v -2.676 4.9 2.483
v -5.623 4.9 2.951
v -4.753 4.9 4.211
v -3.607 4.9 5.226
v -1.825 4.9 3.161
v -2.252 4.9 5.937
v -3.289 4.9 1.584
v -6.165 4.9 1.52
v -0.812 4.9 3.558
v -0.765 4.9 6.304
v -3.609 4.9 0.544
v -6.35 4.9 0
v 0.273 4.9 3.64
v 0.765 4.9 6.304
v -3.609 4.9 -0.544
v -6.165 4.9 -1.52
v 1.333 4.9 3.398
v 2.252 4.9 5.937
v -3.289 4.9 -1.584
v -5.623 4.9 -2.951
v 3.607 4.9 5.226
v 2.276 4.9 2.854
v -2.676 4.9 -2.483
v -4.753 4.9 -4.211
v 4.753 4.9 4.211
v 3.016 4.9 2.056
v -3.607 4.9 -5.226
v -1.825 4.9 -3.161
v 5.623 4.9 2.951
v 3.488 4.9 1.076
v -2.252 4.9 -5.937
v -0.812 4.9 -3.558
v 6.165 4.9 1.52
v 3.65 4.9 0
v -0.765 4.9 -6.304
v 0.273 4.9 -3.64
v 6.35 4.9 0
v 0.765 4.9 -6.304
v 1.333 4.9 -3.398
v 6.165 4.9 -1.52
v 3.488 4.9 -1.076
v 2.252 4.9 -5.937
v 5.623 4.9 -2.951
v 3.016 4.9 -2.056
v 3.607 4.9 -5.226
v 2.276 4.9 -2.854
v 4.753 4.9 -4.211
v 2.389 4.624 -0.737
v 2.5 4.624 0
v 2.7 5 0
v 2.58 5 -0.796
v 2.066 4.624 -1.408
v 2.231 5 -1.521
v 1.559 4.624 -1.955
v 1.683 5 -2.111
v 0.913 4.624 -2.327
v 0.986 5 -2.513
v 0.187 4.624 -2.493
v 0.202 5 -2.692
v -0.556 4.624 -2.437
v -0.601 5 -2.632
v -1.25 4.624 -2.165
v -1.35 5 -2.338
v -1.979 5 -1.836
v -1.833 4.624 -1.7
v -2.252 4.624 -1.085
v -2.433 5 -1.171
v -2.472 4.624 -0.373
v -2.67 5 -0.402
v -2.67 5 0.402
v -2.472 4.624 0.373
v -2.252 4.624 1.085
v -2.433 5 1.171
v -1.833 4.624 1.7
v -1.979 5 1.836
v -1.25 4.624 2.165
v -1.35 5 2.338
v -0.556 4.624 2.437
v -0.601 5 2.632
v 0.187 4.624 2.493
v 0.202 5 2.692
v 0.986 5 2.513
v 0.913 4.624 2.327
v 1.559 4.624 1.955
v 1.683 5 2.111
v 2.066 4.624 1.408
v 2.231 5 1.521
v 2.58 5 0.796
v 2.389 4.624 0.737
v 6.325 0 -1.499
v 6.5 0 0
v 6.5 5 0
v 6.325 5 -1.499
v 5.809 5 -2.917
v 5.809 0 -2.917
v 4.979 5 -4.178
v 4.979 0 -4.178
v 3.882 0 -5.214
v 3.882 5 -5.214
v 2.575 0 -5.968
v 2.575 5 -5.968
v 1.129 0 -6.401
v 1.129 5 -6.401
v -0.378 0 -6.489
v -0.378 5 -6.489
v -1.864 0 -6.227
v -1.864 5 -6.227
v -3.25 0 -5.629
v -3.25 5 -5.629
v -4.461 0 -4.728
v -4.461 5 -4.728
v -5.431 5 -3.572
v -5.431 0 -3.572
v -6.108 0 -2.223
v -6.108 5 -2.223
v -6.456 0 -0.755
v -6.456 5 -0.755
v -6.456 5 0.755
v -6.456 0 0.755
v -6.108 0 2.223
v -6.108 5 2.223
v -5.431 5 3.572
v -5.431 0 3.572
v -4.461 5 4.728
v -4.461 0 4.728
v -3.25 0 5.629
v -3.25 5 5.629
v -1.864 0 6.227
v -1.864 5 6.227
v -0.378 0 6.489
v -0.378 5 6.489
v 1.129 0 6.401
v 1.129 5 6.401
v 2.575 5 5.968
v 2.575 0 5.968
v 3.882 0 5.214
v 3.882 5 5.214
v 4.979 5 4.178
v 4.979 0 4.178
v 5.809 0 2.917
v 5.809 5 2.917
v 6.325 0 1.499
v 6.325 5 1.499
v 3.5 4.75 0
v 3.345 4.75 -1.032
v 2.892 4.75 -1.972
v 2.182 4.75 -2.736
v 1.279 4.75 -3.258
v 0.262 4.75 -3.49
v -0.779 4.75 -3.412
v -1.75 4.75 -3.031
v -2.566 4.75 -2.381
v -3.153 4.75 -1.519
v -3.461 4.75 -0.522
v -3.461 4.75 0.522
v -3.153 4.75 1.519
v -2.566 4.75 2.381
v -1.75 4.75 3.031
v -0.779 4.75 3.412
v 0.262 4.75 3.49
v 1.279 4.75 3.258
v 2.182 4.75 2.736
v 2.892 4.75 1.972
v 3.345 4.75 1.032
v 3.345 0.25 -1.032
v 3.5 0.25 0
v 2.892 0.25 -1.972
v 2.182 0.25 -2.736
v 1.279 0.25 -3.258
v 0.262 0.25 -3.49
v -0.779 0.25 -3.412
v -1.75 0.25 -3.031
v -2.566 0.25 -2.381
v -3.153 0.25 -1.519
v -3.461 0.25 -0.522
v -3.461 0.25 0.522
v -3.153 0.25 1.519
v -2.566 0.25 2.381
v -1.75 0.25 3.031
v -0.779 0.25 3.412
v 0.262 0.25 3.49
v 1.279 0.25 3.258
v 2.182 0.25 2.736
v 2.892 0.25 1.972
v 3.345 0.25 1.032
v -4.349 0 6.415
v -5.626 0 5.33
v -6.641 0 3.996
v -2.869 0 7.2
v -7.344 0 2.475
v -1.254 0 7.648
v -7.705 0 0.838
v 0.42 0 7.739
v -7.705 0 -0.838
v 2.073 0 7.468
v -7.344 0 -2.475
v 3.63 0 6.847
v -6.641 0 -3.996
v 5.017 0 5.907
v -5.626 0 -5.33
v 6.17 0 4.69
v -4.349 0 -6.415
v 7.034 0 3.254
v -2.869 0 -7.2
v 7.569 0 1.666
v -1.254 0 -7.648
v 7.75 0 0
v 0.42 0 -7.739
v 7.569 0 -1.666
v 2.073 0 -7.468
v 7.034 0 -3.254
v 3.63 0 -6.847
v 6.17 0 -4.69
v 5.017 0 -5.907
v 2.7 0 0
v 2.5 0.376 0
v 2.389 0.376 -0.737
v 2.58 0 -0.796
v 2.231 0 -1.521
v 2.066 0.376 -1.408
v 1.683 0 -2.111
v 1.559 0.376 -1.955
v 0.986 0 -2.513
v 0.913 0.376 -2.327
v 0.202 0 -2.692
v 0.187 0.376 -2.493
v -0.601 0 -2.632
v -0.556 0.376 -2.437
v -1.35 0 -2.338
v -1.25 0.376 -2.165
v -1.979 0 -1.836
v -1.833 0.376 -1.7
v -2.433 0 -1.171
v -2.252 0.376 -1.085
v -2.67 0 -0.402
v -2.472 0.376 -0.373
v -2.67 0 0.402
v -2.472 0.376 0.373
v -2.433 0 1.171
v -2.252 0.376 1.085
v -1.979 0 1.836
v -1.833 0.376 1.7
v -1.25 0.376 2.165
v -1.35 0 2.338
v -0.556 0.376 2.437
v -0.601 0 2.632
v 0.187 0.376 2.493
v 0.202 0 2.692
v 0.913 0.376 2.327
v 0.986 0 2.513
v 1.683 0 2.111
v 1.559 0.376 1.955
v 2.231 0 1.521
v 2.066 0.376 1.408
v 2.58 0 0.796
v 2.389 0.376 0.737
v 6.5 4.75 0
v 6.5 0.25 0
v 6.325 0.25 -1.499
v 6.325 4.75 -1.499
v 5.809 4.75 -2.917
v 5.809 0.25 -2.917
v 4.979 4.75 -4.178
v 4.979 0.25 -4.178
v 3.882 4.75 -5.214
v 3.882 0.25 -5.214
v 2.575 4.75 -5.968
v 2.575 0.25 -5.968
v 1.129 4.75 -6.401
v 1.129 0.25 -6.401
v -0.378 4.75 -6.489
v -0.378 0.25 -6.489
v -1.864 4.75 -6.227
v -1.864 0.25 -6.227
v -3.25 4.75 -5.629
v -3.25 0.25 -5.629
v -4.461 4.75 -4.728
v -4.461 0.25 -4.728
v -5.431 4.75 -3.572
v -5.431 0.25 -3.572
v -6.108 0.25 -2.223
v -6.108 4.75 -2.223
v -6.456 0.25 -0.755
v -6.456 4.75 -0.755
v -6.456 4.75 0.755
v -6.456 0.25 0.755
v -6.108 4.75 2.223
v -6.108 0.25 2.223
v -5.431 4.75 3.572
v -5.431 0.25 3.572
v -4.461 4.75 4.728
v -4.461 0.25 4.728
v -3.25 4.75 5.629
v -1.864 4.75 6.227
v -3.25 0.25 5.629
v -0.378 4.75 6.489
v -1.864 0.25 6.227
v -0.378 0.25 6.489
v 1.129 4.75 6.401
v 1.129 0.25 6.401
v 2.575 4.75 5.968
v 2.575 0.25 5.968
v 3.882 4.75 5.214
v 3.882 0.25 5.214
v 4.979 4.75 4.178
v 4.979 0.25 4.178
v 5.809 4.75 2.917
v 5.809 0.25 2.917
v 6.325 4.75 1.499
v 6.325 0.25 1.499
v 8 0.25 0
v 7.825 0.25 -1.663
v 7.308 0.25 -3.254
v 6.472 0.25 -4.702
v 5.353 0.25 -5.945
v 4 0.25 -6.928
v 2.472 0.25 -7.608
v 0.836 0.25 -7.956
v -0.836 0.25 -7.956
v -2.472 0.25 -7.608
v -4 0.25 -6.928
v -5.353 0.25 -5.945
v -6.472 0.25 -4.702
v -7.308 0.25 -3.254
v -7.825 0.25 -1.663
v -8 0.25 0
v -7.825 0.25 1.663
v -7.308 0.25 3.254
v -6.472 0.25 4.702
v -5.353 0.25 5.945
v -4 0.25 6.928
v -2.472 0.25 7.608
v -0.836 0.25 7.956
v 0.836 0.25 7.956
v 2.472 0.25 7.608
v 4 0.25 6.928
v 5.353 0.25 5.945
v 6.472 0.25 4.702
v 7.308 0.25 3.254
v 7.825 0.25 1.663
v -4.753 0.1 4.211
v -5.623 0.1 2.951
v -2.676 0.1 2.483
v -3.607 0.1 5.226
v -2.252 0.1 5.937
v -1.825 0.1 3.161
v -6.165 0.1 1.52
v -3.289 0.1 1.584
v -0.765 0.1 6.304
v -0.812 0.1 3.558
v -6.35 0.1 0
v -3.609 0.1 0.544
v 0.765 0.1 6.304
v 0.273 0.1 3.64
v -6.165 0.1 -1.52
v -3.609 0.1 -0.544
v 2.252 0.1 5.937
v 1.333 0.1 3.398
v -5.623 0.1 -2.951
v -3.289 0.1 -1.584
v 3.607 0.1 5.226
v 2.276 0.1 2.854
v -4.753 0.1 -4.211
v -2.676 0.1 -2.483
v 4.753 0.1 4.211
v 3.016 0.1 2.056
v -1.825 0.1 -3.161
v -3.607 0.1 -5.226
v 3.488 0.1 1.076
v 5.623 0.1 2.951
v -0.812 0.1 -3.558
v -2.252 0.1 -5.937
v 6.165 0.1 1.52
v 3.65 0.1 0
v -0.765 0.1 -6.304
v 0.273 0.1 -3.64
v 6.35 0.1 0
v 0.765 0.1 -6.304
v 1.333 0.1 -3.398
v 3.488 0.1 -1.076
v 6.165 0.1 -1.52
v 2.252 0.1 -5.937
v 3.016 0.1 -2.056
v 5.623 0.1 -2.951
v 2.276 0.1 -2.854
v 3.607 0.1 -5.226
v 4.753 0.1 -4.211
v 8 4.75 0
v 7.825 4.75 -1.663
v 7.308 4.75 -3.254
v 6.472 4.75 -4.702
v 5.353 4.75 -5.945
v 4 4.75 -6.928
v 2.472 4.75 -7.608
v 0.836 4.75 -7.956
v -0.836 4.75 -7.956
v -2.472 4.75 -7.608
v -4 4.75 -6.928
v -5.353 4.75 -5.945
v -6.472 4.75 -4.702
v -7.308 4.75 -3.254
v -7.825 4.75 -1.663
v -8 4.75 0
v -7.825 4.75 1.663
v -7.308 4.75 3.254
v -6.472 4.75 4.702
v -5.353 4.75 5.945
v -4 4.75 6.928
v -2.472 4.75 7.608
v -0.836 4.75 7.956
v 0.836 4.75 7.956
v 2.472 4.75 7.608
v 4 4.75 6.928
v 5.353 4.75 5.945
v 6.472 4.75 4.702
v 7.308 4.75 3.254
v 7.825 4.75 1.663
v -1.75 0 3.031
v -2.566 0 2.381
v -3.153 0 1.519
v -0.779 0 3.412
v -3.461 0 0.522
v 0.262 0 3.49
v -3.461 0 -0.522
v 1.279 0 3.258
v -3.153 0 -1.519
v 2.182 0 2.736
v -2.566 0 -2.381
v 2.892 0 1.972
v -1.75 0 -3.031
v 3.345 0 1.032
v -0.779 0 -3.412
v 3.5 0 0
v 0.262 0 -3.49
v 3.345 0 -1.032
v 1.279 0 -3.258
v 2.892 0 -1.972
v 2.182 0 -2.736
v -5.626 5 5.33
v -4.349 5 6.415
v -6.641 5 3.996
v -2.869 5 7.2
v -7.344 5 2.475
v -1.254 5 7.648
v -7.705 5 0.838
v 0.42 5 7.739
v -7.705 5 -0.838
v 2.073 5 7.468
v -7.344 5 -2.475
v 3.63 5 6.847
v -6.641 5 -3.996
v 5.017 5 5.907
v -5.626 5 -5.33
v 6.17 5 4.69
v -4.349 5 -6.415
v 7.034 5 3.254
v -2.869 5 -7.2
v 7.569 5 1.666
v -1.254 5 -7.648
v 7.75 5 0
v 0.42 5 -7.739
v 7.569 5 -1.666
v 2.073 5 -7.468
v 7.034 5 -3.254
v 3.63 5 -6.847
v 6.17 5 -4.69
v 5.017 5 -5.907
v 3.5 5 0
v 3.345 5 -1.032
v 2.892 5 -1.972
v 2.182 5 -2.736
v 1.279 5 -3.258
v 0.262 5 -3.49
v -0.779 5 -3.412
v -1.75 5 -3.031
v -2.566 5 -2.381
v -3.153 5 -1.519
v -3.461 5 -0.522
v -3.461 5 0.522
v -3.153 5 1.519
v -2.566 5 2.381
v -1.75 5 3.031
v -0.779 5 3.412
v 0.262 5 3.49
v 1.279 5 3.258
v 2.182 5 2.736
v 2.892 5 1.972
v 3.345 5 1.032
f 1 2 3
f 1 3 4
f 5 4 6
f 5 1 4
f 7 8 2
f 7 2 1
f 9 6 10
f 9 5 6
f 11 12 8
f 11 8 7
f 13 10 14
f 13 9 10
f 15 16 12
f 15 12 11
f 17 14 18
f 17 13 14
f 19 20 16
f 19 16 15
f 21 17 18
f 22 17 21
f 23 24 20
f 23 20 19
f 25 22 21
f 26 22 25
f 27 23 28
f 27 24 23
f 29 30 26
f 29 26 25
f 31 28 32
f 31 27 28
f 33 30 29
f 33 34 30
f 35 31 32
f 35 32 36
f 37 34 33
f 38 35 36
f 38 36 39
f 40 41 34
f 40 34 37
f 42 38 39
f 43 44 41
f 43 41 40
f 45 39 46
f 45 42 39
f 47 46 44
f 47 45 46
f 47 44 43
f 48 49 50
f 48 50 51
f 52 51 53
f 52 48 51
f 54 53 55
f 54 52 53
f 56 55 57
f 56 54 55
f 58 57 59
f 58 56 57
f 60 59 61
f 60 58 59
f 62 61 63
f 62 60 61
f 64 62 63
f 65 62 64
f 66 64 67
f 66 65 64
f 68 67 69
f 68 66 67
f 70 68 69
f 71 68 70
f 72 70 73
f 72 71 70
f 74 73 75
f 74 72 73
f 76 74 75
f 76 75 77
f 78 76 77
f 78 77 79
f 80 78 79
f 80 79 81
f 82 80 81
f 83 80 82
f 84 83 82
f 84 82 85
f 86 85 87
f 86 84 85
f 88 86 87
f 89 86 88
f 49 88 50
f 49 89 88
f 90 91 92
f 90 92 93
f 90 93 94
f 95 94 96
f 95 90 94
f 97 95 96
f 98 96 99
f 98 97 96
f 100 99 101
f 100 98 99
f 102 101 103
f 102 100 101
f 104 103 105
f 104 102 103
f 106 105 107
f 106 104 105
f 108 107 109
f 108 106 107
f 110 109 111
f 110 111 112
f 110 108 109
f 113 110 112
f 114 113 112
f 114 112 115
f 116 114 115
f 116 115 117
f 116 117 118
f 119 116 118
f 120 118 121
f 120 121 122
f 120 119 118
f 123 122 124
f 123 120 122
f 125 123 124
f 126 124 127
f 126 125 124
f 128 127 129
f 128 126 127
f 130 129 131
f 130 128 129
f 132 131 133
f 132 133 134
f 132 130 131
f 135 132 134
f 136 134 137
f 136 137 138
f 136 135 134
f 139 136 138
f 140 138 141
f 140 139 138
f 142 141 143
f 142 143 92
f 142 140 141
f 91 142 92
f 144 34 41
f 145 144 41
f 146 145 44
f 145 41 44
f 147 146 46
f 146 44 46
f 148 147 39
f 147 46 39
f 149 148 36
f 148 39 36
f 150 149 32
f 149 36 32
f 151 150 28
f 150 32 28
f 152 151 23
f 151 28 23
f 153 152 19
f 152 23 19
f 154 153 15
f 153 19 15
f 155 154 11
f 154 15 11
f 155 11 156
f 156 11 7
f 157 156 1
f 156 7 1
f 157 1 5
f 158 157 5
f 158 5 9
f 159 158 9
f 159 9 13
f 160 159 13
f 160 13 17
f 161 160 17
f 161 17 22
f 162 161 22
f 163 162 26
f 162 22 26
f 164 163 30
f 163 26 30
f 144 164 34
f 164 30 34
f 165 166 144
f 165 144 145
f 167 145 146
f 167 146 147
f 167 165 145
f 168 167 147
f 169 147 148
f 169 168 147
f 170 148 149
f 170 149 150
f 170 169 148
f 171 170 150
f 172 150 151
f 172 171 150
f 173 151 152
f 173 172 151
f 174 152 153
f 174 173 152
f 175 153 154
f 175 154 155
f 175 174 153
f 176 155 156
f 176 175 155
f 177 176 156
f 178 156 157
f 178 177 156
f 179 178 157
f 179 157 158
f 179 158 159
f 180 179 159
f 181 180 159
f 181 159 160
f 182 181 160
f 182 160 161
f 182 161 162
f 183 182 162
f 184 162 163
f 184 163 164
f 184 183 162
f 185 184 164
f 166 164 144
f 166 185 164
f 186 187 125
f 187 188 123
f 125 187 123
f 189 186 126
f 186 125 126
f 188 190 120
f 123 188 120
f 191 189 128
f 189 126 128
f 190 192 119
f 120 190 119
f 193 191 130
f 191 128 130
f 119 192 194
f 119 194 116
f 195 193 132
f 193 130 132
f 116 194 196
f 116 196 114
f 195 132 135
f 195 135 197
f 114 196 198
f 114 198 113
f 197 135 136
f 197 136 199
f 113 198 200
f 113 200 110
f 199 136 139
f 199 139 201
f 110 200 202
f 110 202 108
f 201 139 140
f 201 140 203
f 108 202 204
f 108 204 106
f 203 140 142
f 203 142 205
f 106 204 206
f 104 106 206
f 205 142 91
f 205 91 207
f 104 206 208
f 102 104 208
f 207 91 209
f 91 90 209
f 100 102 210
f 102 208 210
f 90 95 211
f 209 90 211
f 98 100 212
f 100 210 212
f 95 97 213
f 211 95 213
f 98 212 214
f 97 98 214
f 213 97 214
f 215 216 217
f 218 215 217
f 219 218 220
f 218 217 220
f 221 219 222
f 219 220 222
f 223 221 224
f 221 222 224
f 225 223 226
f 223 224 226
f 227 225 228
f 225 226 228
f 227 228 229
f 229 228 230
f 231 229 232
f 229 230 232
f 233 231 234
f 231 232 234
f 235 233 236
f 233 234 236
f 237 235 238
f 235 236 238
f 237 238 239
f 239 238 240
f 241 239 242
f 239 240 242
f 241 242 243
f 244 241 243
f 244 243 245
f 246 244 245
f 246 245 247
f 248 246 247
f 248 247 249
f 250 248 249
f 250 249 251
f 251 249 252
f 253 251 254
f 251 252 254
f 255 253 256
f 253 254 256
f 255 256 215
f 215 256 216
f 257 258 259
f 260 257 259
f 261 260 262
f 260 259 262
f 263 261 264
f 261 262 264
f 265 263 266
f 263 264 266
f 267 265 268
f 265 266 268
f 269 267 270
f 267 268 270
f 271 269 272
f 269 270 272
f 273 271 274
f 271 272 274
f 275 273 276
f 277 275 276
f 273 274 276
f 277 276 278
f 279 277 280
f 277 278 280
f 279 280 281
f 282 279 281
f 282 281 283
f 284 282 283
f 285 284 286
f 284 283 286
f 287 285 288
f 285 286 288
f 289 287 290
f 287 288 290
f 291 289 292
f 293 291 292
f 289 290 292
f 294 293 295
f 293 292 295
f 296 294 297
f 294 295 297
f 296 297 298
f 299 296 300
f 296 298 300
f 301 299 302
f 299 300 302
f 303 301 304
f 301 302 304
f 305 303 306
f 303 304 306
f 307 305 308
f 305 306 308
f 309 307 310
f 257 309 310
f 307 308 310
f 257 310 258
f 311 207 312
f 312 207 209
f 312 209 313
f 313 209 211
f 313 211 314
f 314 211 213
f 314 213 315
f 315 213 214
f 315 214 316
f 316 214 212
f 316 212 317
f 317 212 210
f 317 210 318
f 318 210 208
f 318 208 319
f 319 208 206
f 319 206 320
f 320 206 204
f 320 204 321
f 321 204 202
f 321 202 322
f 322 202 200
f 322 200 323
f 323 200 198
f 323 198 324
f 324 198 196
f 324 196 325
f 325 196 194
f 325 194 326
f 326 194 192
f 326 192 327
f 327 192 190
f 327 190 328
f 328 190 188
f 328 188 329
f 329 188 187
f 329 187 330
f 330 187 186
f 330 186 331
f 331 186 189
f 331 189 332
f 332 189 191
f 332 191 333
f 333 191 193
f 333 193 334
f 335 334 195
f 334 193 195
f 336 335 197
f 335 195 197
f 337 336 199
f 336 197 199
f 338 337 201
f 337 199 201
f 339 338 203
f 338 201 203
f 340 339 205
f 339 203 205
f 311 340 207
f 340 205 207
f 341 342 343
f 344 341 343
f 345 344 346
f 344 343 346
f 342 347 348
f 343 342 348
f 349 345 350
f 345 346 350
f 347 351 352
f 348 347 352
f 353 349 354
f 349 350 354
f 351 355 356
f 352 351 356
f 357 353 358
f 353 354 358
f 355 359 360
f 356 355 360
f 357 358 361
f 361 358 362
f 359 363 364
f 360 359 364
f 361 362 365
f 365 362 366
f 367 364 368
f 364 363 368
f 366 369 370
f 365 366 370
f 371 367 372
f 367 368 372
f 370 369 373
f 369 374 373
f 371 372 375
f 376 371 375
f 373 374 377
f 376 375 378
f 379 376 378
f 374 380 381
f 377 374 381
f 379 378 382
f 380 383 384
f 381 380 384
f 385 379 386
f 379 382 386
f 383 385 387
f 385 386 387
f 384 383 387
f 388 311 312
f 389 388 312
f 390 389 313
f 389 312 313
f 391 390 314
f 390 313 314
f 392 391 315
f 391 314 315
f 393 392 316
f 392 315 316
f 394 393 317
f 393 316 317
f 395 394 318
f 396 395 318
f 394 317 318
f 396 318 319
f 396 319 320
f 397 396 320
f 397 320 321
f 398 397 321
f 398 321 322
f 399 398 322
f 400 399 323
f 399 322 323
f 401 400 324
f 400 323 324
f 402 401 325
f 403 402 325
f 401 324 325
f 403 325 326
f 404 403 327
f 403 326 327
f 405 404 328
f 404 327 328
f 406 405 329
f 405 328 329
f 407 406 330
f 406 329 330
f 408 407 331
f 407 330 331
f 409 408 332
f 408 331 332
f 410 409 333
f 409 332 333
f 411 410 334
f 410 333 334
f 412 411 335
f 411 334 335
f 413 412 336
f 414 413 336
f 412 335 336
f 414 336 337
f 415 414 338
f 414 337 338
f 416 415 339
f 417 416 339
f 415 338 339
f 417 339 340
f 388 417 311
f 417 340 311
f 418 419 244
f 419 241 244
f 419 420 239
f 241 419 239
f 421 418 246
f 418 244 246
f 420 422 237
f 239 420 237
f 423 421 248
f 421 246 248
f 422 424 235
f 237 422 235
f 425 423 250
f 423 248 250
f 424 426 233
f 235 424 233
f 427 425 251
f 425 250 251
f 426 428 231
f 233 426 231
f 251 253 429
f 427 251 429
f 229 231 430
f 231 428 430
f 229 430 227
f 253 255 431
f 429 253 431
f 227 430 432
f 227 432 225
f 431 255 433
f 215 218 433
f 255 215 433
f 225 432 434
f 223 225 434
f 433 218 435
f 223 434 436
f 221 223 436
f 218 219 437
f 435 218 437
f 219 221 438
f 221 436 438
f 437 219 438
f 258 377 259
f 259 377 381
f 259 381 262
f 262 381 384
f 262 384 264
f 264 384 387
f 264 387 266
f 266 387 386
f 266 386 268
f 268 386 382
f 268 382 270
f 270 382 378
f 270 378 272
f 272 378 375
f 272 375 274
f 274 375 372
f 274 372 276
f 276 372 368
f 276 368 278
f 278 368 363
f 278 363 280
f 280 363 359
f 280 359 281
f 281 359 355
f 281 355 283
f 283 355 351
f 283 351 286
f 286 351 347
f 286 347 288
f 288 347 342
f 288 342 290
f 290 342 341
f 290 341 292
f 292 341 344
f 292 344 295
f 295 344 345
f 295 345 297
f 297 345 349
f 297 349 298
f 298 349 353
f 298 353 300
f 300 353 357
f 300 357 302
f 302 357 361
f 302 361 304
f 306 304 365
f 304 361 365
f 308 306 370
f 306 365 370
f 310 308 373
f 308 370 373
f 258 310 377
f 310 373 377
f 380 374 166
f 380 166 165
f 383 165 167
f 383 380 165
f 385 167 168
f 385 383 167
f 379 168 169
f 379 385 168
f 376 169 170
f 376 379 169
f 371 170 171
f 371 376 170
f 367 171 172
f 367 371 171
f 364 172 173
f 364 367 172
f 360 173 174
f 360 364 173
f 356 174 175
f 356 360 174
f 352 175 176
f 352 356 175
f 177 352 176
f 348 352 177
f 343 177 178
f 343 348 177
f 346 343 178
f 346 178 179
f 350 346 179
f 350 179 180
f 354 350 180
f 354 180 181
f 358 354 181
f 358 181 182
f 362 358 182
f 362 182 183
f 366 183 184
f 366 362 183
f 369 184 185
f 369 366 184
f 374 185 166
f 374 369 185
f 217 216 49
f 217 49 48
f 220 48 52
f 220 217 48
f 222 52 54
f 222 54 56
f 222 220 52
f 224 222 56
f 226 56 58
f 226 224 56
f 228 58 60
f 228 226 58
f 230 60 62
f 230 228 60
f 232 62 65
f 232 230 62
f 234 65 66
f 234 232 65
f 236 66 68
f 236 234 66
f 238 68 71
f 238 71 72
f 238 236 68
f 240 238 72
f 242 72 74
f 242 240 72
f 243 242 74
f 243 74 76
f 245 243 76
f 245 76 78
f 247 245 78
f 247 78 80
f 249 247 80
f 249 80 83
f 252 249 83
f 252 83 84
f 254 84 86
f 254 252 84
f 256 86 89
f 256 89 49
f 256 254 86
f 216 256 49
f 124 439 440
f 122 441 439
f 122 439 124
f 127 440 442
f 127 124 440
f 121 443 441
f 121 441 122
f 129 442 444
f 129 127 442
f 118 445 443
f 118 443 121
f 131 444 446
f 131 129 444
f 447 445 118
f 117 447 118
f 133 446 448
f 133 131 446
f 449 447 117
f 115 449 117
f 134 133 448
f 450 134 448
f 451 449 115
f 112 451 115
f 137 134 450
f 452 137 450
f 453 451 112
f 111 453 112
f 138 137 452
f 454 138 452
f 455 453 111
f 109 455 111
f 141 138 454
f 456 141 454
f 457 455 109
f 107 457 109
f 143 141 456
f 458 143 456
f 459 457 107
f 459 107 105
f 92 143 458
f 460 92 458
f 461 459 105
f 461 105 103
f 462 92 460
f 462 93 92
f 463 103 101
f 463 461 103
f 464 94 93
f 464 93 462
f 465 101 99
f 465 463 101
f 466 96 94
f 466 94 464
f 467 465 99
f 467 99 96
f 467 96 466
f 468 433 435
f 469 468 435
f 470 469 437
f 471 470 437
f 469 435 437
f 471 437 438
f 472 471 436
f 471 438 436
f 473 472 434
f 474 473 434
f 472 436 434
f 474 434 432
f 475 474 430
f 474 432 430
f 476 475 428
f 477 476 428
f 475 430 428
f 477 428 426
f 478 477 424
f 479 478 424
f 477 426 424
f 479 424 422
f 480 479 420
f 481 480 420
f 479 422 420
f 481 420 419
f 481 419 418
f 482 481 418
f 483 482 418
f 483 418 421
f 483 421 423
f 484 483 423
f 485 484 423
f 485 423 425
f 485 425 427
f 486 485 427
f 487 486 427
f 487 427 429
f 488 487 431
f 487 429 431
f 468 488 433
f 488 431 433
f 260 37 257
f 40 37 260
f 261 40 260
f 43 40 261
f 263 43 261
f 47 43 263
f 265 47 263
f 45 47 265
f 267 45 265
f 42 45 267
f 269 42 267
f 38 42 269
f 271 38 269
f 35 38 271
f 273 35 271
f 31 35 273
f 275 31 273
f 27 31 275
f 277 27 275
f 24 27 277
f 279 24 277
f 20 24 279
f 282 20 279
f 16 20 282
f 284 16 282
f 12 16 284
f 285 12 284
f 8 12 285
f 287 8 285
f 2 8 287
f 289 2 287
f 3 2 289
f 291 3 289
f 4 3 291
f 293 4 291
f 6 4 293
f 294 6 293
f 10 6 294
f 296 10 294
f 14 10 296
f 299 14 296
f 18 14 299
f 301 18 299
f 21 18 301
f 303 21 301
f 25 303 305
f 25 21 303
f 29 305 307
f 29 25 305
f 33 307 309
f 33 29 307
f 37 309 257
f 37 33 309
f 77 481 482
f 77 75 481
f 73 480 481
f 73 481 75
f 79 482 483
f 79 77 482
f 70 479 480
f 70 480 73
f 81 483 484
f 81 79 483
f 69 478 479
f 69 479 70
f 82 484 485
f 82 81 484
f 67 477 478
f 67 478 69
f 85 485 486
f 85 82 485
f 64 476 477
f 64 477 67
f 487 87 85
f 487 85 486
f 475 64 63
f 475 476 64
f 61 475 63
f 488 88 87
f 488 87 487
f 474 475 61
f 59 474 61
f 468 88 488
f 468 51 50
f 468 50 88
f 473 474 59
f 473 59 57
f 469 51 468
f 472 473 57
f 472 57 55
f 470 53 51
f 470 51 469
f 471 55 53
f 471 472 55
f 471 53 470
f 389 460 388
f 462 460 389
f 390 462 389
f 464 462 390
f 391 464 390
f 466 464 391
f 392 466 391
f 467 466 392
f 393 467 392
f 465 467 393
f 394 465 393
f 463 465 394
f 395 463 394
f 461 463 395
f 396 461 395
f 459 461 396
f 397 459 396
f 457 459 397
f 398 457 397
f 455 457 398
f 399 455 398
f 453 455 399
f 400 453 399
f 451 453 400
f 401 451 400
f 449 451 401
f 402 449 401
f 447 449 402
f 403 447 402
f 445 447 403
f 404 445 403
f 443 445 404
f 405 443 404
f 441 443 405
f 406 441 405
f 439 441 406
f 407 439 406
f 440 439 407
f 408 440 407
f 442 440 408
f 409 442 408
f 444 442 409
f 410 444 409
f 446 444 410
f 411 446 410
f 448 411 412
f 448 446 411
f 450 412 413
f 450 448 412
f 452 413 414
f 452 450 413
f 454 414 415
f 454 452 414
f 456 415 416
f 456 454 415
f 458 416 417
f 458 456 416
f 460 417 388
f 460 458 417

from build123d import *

# Parameters (mm, degrees)
SKETCH_1_R        = 3.5
SKETCH_1_R_2      = 2.5
EXTRUDE_1_DEPTH   = 5
SKETCH_1_R_3      = 8
SKETCH_1_R_4      = 6.5
EXTRUDE_1_2_DEPTH = 5
EXTRUDE_START     = 0.1
SKETCH_1_3_R      = 6.5
SKETCH_1_3_R_2    = 3.5
EXTRUDE_2_DEPTH   = 4.8
CHAMFER_1_SIZE    = 0.25
CHAMFER_2_SIZE    = 0.2
CHAMFER_2_SIZE2   = 0.376145293
CHAMFER_3_SIZE    = 0.15
CHAMFER_4_SIZE    = 0.2
CHAMFER_4_SIZE2   = 0.376145293


with BuildPart() as part:
    # Эскиз1 → Бобышка-Вытянуть1 (new body)
    with BuildSketch(Plane(origin=(0, 0, 0), x_dir=(1, 0, 0), z_dir=(0, 1, 0))):
        Circle(SKETCH_1_R)
        Circle(SKETCH_1_R_2, mode=Mode.SUBTRACT)
    extrude(amount=EXTRUDE_1_DEPTH)

    # Фаска2
    chamfer_2_edges = [part.edges().sort_by_distance(p)[0] for p in [
        (-2.5, 5, 0),
    ]]
    chamfer_2_side = [part.faces().sort_by_distance(p)[0] for p in [
        (-3.401005051, 5, 0),
    ]]
    chamfer(chamfer_2_edges, length=CHAMFER_2_SIZE, length2=CHAMFER_2_SIZE2, reference=chamfer_2_side[0])

    # Фаска4
    chamfer_4_edges = [part.edges().sort_by_distance(p)[0] for p in [
        (-2.5, 0, 0),
    ]]
    chamfer_4_side = [part.faces().sort_by_distance(p)[0] for p in [
        (-3.401005051, 0, 0),
    ]]
    chamfer(chamfer_4_edges, length=CHAMFER_4_SIZE, length2=CHAMFER_4_SIZE2, reference=chamfer_4_side[0])


with BuildPart() as body_2:
    # Эскиз1 → Extrude 1 2 (new body)
    with BuildSketch(Plane(origin=(0, 0, 0), x_dir=(1, 0, 0), z_dir=(0, 1, 0))):
        Circle(SKETCH_1_R_3)
        Circle(SKETCH_1_R_4, mode=Mode.SUBTRACT)
    extrude(amount=EXTRUDE_1_2_DEPTH)

    # Фаска1
    chamfer_1_edges = [body_2.edges().sort_by_distance(p)[0] for p in [
        (-8, 0, 0),
        (-8, 5, 0),
    ]]
    chamfer(chamfer_1_edges, length=CHAMFER_1_SIZE)


with BuildPart() as body_3:
    # Эскиз1<3> → Бобышка-Вытянуть2 (new body)
    with BuildSketch(Plane(origin=(0, 0, 0), x_dir=(1, 0, 0), z_dir=(0, 1, 0)).offset(EXTRUDE_START)):
        Circle(SKETCH_1_3_R)
        Circle(SKETCH_1_3_R_2, mode=Mode.SUBTRACT)
    extrude(amount=EXTRUDE_2_DEPTH)

    # Фаска3
    chamfer_3_edges = [body_3.edges().sort_by_distance(p)[0] for p in [
        (-6.5, 4.9, 0),
        (-6.5, 0.1, 0),
        (-3.5, 0.1, 0),
        (-3.5, 4.9, 0),
    ]]
    chamfer(chamfer_3_edges, length=CHAMFER_3_SIZE)


solid = Compound([part.part, body_2.part, body_3.part])
